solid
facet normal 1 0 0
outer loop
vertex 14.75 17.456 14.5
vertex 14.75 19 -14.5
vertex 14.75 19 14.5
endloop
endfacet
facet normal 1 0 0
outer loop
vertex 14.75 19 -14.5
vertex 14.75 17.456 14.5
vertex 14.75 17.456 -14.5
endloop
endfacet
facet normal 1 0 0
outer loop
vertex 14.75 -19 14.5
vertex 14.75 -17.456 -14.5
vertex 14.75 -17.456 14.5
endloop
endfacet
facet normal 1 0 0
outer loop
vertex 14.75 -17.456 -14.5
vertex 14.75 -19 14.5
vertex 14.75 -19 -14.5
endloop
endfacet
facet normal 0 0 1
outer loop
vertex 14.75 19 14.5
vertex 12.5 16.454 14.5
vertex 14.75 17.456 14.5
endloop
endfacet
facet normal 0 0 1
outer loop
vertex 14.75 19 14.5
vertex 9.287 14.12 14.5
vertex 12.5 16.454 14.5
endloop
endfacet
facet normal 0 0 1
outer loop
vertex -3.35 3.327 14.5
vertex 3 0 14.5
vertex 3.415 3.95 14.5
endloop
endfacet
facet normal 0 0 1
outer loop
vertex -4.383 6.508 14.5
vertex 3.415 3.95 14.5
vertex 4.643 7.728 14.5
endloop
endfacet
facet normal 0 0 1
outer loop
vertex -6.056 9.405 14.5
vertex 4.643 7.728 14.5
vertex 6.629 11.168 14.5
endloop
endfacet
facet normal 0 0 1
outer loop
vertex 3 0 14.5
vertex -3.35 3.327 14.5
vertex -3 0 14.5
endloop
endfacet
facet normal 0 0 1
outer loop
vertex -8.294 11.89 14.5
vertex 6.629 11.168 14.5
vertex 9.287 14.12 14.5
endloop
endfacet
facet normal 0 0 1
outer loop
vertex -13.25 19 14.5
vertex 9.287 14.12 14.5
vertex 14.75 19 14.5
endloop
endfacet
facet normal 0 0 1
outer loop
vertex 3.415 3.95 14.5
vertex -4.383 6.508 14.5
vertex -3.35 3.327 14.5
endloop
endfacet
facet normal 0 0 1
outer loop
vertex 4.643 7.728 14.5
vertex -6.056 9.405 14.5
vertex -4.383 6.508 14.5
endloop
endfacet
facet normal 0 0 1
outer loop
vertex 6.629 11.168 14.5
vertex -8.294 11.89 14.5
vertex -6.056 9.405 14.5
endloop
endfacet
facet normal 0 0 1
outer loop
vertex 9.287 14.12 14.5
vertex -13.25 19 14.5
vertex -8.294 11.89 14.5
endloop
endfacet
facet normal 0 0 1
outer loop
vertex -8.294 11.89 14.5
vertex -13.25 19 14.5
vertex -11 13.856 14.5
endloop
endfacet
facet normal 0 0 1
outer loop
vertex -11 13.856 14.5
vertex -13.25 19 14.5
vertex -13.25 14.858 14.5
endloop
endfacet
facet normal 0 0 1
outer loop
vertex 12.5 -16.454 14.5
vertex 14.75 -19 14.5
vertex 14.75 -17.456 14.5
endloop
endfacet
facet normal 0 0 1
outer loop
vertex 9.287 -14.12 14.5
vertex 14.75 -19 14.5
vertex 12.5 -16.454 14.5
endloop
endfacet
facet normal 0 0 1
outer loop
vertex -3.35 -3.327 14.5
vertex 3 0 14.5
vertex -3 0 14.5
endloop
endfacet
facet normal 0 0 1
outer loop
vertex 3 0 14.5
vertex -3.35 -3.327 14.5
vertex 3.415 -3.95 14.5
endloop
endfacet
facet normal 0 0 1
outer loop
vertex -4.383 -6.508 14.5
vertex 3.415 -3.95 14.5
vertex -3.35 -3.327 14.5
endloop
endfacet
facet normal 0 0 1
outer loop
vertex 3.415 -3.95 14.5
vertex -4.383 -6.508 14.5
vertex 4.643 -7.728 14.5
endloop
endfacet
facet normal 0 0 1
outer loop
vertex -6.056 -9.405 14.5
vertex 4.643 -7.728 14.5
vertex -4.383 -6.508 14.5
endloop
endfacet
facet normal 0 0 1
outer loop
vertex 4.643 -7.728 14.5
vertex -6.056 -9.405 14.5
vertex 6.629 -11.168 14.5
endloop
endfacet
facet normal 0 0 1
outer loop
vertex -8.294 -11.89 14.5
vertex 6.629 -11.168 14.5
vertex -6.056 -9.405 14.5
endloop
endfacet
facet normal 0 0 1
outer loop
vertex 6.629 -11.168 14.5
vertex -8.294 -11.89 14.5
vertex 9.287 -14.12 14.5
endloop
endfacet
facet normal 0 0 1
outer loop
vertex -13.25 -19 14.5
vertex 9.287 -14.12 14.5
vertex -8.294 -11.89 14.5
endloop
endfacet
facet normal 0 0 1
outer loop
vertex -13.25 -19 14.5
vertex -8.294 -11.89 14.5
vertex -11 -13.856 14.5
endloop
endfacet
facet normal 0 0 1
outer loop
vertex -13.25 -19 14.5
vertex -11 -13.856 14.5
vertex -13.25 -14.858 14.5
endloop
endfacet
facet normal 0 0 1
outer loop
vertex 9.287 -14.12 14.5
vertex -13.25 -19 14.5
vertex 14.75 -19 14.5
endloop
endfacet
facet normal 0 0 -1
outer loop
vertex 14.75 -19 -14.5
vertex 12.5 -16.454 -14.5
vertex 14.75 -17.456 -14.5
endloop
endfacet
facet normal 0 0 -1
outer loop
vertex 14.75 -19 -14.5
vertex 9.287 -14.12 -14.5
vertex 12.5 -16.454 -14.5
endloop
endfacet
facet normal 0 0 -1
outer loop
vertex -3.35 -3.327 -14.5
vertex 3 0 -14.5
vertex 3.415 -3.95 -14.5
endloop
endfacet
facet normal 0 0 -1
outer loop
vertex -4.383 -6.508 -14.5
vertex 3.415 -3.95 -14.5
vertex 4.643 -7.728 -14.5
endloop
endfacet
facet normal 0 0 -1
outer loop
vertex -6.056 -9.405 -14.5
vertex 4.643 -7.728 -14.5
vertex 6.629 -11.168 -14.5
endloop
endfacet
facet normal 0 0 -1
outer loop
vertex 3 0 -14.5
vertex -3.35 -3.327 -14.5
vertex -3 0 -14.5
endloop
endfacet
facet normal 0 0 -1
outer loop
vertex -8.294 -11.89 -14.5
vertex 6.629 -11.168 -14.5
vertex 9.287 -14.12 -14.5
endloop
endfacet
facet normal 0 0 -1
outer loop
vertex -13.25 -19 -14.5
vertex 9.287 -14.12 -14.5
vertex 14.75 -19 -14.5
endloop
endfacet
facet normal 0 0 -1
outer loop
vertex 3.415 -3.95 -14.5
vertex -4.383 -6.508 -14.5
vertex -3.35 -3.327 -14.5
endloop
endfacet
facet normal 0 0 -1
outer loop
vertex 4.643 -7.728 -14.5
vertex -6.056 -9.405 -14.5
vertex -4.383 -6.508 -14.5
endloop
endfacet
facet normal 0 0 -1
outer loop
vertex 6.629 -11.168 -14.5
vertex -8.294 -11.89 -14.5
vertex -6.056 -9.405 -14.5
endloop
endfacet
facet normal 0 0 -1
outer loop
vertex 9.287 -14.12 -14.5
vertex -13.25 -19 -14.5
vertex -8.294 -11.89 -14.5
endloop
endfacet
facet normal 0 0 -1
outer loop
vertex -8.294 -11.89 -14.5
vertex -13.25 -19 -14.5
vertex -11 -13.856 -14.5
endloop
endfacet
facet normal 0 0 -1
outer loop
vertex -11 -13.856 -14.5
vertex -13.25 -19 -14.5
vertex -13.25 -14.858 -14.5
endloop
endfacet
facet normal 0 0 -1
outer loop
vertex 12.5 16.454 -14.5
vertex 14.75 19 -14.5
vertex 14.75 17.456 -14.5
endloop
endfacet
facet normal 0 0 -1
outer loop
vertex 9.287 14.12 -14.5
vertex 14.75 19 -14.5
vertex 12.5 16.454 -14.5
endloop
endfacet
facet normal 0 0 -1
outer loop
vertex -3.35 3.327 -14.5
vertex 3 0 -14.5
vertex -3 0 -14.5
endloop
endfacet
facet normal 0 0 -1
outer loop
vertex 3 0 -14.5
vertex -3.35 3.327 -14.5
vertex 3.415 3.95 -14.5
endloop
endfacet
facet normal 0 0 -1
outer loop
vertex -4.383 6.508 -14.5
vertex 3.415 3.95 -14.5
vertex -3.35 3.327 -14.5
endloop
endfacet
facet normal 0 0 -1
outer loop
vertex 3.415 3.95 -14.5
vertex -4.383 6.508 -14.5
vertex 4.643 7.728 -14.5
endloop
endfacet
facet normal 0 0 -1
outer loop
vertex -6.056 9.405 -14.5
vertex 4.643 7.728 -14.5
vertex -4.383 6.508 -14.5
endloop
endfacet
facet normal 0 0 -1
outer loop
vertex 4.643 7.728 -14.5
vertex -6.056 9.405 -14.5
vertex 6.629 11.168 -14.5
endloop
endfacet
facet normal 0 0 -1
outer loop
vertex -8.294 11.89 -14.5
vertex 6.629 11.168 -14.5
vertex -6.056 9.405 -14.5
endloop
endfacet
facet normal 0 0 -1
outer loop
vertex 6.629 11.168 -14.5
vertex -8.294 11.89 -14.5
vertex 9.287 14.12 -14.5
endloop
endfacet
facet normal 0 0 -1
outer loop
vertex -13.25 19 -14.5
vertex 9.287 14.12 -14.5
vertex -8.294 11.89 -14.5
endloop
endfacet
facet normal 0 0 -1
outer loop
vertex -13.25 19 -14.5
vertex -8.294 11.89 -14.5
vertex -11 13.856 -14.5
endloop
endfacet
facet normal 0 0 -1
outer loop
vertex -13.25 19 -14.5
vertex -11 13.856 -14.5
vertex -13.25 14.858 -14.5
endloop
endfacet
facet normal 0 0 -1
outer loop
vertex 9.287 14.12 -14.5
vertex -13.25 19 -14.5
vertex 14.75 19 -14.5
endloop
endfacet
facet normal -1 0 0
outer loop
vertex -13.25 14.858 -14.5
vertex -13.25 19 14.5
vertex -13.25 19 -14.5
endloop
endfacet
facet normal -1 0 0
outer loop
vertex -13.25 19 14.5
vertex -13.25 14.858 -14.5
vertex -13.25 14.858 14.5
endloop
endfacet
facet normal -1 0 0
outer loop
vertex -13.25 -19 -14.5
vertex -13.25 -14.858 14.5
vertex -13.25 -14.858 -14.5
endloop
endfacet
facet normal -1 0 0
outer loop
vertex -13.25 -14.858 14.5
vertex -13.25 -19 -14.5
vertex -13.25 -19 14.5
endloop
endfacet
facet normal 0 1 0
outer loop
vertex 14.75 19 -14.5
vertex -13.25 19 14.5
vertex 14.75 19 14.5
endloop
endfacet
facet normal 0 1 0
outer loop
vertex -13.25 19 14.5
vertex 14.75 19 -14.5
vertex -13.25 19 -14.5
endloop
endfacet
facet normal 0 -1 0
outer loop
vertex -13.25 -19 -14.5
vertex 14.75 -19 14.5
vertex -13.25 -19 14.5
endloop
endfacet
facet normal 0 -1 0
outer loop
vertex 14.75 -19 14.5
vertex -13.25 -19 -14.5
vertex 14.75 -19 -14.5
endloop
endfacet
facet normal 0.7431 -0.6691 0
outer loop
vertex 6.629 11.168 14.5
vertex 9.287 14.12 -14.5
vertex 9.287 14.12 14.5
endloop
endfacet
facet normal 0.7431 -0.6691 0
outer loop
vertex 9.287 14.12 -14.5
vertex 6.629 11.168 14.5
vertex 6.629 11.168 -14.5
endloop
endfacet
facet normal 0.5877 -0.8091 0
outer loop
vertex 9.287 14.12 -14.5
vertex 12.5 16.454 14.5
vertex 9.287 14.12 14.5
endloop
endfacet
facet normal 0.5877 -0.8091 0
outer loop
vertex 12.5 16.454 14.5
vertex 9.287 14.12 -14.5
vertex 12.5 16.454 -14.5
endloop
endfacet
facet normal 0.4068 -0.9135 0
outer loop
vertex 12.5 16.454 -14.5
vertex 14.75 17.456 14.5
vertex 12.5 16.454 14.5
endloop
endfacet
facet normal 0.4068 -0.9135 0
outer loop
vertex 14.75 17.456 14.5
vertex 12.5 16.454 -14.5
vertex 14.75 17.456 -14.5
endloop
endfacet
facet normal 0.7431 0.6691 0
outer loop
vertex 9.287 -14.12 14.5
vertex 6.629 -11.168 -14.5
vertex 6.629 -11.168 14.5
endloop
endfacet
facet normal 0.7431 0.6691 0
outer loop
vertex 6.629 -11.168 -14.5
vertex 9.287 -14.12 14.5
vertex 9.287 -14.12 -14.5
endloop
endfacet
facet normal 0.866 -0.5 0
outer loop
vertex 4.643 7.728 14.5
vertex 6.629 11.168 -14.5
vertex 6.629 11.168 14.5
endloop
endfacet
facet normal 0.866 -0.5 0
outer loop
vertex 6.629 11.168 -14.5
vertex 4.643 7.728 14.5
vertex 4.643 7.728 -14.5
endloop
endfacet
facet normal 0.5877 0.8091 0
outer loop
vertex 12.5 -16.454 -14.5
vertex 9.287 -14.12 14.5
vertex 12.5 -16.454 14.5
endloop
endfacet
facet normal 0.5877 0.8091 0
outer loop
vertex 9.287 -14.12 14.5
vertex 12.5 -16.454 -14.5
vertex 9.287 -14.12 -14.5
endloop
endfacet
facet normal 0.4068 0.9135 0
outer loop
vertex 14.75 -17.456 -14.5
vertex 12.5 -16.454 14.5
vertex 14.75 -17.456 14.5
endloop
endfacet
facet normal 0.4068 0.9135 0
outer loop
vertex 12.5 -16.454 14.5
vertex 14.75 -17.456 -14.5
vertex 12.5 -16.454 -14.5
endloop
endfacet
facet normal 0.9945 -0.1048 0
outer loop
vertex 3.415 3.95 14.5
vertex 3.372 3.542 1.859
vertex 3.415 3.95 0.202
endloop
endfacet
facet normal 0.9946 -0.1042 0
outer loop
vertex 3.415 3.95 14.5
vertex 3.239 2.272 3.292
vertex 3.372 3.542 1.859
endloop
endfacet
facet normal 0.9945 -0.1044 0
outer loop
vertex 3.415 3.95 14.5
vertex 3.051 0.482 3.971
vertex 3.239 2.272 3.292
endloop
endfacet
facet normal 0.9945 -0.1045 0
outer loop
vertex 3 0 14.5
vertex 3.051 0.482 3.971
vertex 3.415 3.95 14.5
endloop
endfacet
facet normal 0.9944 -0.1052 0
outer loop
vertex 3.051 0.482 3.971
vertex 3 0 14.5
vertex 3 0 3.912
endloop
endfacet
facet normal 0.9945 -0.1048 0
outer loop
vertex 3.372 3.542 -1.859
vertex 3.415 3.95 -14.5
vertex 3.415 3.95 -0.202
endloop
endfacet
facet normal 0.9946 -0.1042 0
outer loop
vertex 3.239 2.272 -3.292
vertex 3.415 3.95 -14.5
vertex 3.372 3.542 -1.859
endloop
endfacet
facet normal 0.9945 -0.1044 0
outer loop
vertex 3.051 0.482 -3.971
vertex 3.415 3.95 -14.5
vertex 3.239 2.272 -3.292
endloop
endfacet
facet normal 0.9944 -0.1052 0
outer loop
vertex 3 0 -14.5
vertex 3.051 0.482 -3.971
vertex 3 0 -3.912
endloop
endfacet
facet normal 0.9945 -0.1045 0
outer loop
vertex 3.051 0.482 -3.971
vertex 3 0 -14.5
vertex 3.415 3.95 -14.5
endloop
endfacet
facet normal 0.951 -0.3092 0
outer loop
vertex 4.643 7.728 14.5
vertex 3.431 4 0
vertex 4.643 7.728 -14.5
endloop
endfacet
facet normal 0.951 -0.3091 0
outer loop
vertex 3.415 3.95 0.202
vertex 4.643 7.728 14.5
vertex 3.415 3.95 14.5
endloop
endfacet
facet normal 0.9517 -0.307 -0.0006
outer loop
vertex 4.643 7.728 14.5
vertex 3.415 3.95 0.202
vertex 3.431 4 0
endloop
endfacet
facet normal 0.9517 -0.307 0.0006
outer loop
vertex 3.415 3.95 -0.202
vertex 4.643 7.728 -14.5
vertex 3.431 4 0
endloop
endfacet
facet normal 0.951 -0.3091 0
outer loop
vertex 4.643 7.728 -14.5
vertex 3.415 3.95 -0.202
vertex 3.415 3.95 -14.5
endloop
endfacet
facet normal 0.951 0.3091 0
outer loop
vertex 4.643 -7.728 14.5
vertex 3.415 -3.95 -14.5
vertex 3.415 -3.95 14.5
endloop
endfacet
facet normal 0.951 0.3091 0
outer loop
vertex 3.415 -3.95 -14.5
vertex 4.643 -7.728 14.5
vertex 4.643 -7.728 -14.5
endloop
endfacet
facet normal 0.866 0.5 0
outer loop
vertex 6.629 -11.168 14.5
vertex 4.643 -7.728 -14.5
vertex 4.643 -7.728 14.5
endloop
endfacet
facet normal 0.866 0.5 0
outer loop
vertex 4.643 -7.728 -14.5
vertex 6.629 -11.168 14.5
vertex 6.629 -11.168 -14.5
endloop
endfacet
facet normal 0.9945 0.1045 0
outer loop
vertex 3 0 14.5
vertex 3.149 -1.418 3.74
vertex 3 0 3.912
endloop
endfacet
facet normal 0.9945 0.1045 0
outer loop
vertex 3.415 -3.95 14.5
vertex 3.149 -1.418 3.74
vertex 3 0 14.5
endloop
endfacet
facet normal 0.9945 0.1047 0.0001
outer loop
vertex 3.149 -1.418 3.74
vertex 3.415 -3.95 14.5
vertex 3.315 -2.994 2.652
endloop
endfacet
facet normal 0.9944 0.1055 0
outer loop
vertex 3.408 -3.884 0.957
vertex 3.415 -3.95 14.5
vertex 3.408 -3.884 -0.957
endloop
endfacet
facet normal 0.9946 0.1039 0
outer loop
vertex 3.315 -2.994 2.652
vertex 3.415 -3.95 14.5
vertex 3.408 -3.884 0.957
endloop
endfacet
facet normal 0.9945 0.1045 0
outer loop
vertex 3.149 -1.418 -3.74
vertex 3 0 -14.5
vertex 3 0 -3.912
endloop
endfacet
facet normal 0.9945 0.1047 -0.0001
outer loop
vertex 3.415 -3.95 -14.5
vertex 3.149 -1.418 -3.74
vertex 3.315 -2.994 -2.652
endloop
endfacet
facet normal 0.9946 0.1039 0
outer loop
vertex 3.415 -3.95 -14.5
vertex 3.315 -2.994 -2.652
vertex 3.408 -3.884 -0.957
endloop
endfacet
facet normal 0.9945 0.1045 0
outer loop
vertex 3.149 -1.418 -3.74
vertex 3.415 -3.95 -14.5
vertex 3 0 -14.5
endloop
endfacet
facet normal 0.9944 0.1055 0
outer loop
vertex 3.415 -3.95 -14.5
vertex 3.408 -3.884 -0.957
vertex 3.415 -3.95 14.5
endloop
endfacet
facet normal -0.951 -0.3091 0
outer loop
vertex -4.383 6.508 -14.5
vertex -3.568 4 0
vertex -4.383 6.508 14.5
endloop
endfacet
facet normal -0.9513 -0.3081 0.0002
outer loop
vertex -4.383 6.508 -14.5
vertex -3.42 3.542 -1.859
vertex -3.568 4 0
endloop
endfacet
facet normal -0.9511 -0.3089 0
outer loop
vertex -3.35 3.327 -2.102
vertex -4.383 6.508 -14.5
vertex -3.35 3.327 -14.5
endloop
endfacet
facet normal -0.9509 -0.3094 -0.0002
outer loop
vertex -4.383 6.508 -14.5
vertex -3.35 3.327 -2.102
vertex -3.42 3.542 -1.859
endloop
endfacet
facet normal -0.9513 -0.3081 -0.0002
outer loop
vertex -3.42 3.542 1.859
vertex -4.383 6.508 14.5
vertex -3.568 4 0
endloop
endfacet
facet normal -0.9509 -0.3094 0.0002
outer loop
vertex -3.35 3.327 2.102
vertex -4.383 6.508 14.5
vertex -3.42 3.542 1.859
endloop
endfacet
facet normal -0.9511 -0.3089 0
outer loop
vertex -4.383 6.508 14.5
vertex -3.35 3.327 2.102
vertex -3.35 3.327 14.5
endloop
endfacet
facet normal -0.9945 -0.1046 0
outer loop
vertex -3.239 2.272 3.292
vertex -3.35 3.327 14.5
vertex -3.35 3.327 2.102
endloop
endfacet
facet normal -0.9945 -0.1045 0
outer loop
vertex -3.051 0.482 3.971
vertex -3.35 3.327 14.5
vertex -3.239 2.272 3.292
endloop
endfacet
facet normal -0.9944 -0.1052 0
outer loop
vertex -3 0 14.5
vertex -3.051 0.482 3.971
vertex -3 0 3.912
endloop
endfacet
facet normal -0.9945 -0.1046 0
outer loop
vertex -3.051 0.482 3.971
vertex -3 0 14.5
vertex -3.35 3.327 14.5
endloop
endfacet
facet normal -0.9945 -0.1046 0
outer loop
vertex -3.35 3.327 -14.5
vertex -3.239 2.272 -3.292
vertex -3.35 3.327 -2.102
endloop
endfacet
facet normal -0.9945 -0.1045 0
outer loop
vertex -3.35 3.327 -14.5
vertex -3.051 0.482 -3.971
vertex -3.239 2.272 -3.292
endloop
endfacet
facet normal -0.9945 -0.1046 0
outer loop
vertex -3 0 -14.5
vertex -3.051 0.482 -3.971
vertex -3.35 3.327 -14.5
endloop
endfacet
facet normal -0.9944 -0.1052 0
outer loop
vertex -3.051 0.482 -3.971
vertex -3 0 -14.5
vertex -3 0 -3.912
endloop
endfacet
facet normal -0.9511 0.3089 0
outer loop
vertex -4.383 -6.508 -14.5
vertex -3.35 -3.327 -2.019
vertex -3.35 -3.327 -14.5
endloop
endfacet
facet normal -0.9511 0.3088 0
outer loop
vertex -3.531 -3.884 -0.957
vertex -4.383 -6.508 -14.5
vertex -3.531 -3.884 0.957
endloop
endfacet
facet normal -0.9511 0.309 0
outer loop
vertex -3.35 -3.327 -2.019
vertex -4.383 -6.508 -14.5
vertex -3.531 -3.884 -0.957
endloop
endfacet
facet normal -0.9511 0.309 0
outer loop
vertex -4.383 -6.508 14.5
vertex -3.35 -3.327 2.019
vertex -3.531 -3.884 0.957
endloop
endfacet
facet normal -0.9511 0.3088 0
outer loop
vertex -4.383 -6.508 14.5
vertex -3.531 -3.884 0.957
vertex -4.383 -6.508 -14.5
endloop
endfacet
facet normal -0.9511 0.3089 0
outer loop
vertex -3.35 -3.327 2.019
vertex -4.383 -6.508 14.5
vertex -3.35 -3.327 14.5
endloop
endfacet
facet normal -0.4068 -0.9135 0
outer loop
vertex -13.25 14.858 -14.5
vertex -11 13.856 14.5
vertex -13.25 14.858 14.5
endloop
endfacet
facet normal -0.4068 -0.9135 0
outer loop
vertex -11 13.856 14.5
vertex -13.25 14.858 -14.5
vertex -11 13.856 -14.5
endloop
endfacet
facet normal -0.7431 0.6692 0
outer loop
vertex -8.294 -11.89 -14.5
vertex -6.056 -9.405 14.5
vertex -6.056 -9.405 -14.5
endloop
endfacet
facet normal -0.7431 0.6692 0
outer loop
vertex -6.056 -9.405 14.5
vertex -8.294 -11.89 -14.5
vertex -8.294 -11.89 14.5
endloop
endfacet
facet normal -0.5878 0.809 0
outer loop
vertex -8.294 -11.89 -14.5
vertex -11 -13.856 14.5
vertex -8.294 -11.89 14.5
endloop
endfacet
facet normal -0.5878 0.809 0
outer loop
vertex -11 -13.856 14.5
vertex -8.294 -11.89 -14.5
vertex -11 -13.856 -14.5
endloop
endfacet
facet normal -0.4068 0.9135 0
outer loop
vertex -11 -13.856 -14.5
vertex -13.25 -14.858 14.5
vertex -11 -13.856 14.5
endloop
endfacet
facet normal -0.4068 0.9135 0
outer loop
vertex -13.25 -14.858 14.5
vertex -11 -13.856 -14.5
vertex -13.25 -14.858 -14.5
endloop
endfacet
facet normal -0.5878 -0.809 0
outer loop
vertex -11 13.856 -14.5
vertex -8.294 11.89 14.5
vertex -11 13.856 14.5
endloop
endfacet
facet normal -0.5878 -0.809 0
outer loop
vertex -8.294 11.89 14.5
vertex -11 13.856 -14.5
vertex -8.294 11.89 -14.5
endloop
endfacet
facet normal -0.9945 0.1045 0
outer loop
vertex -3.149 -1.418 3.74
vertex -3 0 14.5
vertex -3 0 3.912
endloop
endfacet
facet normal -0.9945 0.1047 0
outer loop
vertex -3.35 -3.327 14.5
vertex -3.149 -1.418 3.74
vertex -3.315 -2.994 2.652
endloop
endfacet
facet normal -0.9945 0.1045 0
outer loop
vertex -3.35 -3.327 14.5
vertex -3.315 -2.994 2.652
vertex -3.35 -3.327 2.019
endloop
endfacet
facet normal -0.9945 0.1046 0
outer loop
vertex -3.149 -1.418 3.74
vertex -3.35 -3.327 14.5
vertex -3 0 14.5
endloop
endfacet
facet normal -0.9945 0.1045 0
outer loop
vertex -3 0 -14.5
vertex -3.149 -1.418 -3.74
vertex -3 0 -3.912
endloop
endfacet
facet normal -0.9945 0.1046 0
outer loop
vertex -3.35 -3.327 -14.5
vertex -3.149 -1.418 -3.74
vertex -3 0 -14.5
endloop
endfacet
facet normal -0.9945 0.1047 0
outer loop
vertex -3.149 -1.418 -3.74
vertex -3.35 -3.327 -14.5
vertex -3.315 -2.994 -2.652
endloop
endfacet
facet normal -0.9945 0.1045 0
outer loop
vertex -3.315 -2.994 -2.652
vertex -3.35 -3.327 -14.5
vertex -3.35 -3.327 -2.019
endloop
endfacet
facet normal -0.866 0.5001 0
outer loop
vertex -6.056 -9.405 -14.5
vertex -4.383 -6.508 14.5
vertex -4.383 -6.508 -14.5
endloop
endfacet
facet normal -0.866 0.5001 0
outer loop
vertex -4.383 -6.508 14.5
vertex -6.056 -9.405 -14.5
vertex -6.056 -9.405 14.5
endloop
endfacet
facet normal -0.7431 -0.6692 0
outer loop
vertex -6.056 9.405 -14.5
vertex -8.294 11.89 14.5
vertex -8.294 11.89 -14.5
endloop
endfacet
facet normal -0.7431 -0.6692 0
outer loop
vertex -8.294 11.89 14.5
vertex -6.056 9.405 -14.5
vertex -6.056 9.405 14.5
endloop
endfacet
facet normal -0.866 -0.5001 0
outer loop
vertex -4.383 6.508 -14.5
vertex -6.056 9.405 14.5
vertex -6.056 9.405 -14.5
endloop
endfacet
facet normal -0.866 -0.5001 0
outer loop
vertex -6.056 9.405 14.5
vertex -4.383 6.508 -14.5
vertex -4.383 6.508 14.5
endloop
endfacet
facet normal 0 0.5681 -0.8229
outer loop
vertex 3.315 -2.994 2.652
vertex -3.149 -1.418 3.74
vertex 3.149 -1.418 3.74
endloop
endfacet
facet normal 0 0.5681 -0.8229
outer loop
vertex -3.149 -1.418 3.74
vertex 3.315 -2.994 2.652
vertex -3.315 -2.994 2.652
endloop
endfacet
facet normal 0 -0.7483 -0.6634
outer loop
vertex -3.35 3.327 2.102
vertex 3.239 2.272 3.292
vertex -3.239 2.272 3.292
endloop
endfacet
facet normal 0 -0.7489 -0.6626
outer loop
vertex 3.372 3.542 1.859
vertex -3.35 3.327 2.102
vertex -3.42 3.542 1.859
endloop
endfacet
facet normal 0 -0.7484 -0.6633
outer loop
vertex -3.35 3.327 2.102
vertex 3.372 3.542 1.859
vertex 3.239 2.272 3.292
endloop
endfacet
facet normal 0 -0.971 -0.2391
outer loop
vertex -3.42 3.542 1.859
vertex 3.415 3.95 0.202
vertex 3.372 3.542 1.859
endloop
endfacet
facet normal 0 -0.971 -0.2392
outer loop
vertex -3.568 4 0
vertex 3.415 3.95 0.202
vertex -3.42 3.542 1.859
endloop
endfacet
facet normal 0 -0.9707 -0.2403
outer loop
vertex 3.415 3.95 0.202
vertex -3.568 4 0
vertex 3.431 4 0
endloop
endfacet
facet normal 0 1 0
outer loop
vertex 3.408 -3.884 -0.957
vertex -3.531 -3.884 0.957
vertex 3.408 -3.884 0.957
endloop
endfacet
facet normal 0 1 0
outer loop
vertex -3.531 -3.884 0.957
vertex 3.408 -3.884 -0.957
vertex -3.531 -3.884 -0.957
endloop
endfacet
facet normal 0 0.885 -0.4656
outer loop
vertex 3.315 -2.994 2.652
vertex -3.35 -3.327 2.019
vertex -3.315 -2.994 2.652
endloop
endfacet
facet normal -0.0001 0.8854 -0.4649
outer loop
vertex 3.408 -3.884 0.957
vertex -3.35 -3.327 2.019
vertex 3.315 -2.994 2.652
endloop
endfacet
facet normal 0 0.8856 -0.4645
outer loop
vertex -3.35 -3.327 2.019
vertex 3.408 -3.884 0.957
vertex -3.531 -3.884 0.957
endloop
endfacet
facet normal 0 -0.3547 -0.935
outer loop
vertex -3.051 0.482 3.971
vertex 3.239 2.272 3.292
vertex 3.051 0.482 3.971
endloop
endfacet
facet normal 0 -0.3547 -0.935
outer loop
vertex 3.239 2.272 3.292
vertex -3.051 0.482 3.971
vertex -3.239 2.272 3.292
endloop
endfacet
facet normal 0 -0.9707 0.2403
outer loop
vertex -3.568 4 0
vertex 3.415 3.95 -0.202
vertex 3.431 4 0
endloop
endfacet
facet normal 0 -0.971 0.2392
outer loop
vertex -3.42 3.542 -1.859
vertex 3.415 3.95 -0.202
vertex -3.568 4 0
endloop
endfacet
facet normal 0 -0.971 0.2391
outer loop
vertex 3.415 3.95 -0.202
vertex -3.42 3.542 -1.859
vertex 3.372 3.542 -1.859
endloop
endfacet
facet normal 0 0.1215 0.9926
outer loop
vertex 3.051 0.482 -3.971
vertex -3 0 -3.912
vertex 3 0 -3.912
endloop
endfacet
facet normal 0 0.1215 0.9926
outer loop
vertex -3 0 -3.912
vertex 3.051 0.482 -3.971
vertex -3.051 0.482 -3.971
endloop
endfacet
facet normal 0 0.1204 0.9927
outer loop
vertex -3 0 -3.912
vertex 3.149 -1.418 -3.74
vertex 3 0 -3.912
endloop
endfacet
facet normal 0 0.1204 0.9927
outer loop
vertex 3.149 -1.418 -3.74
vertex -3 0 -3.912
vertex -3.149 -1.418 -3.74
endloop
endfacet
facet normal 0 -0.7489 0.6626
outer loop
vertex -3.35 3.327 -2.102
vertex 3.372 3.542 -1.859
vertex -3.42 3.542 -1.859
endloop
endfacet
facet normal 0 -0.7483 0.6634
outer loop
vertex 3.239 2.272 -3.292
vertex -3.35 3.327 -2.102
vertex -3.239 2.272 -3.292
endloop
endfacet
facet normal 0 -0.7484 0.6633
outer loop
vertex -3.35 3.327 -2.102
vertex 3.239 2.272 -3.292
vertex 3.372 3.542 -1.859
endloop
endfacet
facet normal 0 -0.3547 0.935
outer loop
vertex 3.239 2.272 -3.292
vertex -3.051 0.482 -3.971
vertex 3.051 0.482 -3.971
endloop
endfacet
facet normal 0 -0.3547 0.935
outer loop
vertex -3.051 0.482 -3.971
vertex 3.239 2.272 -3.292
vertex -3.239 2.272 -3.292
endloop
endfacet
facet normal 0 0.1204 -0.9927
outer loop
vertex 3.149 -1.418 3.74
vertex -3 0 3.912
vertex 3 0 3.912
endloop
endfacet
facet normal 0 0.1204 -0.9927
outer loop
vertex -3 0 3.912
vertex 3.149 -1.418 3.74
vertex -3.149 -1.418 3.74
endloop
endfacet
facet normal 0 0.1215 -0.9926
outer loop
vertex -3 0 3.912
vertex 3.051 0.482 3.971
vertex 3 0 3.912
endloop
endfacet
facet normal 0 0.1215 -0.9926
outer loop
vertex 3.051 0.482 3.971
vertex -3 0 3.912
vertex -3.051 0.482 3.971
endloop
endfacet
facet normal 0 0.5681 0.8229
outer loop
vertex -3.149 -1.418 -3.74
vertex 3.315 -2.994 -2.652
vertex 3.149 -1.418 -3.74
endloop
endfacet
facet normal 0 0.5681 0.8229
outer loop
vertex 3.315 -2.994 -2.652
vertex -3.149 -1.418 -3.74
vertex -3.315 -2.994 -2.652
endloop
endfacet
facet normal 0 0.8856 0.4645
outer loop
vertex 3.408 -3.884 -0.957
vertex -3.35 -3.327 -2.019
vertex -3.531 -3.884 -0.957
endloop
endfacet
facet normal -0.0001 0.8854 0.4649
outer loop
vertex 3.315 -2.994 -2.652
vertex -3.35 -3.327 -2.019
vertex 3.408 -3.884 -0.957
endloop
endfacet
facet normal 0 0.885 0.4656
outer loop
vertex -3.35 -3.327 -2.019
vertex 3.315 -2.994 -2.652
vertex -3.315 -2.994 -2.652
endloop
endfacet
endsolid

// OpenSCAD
radius1 = 19;
radius2 = 16;
separation = 6;
height = 30;
hole1 = 4;
module trampclamp()
{
	
		
	difference() {
		translate([0.25*(radius1-radius2), 0, 0])
		cube([0.8*(radius1 + radius2),2*radius1 , height-1 ], center = true);
		translate([radius1+separation/2, 0, 0])
		cylinder(h = height, r = radius1, center = true);	
		translate([-(radius2+separation/2), 0, 0])
		cylinder(h = height, r = radius2, center = true);	
		rotate([90,0,90])
		cylinder(h = separation*2, r = hole1, center = true);
				
	}
		
}

trampclamp();

